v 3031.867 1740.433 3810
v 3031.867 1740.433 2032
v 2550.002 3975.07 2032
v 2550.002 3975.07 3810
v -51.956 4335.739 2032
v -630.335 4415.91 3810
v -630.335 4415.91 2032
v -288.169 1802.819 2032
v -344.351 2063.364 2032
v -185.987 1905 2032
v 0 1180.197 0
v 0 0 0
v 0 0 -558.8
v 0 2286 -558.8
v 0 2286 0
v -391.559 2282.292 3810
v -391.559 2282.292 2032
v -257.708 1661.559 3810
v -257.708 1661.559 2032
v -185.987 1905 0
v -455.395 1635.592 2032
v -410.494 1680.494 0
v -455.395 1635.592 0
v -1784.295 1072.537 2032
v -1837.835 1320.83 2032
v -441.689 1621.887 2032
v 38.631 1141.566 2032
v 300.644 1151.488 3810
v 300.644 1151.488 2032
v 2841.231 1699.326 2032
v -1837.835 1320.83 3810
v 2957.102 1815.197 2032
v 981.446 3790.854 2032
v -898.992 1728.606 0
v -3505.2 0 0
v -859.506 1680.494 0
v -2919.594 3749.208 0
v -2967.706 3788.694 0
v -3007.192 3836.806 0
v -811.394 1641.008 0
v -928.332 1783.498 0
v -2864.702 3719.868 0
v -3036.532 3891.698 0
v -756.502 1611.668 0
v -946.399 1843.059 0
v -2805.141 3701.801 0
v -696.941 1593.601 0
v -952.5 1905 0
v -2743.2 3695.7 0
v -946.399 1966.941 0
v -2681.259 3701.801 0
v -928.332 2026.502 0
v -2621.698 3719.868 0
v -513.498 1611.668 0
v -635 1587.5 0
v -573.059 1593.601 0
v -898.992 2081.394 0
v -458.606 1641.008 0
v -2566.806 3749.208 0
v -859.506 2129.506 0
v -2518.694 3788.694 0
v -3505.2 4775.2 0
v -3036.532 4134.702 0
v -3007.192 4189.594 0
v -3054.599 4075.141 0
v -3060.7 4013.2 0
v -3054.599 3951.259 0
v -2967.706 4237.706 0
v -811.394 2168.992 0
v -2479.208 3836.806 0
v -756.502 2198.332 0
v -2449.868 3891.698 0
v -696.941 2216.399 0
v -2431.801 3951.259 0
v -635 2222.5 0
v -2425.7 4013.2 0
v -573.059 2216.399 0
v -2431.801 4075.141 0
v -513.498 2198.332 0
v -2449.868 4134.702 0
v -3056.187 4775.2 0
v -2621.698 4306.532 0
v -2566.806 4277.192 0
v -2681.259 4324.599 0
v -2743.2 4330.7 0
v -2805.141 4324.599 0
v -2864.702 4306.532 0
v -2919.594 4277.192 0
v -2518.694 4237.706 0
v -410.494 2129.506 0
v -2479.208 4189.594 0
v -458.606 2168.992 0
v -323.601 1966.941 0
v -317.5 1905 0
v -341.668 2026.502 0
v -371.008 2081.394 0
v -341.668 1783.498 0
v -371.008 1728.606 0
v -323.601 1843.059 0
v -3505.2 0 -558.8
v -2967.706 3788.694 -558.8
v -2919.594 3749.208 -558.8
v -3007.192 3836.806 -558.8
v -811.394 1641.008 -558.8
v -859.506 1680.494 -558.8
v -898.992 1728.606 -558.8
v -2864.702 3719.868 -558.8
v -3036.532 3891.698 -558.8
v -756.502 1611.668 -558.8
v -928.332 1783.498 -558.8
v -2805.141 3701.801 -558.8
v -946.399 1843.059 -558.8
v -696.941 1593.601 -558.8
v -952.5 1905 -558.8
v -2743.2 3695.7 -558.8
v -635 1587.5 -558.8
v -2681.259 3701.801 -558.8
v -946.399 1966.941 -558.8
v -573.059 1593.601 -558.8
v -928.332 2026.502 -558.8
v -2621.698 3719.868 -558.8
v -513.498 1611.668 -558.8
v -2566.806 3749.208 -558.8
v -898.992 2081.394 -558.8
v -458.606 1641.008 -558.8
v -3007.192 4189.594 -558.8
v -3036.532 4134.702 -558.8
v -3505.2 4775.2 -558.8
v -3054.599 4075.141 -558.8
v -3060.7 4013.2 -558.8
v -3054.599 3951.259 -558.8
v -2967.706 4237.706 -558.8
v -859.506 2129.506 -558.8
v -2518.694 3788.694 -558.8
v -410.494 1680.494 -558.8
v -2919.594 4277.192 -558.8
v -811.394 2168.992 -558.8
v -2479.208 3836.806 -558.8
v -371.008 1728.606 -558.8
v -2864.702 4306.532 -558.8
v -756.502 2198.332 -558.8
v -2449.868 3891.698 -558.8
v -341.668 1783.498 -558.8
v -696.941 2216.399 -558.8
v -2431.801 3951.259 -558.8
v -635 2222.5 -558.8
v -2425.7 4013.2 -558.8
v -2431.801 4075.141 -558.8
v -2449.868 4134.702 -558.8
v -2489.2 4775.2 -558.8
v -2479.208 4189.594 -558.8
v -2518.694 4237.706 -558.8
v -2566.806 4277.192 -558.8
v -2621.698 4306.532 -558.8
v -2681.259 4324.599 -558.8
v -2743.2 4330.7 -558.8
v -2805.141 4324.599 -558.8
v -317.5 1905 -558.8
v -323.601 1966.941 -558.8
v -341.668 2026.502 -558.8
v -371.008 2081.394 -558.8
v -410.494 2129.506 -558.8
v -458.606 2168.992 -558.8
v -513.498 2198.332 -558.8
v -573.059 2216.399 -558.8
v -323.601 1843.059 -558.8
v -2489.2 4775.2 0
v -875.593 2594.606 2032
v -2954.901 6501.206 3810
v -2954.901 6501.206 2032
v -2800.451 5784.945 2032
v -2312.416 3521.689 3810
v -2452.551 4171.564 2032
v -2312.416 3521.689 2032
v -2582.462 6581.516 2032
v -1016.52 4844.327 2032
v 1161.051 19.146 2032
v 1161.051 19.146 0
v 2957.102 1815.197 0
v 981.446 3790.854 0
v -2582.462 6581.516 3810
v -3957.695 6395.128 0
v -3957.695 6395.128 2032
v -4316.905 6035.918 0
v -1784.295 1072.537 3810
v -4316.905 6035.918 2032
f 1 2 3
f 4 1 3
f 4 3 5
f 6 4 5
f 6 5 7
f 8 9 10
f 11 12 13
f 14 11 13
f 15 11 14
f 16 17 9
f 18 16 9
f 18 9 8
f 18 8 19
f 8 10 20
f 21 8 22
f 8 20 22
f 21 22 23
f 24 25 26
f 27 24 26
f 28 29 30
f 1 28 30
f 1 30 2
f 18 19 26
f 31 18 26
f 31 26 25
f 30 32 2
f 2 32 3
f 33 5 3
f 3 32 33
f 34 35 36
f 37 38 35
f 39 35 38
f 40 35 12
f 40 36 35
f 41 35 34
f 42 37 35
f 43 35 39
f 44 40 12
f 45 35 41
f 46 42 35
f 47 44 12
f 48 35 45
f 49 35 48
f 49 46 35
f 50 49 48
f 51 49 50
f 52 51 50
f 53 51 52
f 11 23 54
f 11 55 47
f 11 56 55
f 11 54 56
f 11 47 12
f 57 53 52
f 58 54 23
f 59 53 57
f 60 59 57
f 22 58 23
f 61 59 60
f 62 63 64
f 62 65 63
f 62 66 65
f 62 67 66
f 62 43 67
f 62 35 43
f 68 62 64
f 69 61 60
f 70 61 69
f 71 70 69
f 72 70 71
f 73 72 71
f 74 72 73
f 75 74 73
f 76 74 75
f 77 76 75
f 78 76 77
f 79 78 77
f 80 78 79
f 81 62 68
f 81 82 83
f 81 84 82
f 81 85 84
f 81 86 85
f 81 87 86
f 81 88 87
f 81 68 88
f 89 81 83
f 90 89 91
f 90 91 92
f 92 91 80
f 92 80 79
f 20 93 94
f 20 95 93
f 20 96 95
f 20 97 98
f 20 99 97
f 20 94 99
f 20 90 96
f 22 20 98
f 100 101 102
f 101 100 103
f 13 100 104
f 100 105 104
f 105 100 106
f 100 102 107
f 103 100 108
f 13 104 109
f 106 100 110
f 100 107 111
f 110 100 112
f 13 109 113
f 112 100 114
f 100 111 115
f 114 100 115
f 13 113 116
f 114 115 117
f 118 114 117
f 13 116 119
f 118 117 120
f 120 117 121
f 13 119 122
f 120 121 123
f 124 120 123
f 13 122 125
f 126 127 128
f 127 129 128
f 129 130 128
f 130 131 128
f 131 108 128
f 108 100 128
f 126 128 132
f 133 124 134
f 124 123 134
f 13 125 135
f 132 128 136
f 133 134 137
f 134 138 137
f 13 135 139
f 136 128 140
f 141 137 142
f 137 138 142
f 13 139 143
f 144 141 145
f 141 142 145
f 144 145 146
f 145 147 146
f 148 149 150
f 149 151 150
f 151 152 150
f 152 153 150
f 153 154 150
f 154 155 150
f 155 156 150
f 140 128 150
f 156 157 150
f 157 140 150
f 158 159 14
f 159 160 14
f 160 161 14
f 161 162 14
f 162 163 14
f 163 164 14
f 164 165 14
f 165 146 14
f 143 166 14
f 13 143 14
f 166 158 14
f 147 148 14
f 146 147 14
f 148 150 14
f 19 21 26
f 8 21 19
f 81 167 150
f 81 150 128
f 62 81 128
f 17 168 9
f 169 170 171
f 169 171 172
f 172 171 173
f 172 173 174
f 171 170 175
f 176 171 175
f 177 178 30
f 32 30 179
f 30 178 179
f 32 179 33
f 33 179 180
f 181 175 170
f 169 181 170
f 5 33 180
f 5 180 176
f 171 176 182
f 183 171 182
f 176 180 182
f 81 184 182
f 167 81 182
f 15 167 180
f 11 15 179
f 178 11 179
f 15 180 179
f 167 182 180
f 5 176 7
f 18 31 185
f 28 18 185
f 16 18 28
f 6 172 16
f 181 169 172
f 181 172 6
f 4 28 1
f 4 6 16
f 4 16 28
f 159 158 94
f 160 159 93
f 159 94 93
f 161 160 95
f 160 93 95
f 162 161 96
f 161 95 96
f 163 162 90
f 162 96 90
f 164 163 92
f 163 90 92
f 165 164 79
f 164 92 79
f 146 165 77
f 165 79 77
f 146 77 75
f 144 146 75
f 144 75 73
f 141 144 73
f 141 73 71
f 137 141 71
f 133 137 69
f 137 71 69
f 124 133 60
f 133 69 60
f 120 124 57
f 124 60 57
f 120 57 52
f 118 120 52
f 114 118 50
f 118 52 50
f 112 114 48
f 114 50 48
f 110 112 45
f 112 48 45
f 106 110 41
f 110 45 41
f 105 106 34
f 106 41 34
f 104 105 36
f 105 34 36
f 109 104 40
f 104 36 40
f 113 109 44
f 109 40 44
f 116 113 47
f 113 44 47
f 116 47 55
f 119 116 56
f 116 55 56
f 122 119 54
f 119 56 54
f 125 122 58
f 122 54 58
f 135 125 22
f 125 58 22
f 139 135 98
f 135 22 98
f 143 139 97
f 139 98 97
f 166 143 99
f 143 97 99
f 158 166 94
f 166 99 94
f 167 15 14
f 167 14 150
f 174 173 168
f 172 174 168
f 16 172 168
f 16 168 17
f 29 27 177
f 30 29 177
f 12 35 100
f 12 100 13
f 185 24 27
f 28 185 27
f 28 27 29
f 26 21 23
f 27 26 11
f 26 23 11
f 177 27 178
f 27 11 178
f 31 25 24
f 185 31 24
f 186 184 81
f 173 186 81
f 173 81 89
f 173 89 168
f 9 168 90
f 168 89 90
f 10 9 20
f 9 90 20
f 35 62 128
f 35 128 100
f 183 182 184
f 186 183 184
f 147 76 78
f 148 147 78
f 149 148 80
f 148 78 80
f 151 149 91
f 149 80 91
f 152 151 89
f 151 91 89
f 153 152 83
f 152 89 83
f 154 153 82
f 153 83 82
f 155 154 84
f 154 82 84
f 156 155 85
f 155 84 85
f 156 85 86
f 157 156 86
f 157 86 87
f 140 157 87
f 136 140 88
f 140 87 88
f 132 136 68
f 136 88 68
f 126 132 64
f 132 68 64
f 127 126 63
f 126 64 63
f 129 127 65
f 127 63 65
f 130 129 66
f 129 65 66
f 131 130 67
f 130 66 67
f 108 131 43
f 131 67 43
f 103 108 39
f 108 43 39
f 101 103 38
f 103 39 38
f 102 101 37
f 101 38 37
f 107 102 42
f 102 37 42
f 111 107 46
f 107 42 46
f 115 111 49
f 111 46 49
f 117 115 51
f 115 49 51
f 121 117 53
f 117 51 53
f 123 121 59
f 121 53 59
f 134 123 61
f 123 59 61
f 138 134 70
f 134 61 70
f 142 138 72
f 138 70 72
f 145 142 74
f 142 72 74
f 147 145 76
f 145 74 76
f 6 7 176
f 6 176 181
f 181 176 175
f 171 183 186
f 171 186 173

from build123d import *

# Parameters (mm, degrees)
F0_R     = 317.5
F2_DEPTH = 558.8
F4_DEPTH = 2032
F6_DEPTH = 1778


# Not quite as in the source:
# - the program builds the solid bodies; features that only make, move or delete a surface that nothing else refers to are left out


with BuildPart() as f2:
    # F0 (on Top) → F2 (new body)
    with BuildSketch(Plane.XY):
        Polygon((-2489.2, 4775.2), (-3505.2, 4775.2), (-3505.2, 4013.2), (-3505.2, 0), (0, 0), (0, 2286), (-508, 2794), align=None)
        with Locations((-2743.2, 4013.2)):
            Circle(F0_R, mode=Mode.SUBTRACT)
        with Locations((-635, 1905)):
            Circle(F0_R, mode=Mode.SUBTRACT)
    extrude(amount=-F2_DEPTH)

    # F1 (on face) → F4 (join)
    with BuildSketch(Plane.XY):
        Polygon((-3957.6947647956, 6395.1280605346), (-4316.9050096384, 6035.9178156918), (-185.9871939465, 1905), (-455.3948775786, 1635.5923163679), (1161.0512242138, 19.1462145755), (2957.1024484277, 1815.1974387893), (981.4461017924, 3790.8537854245), align=None)
    extrude(amount=F4_DEPTH)

    # F5 (on face) → F6 (join)
    with BuildSketch(Plane.XY.offset(2032)):
        Polygon((-257.708154999, 1661.5593220192), (-1837.8351896914, 1320.8298776882), (-1784.2947228834, 1072.5368684955), (300.6435319736, 1151.4881192346), (3031.8666330935, 1740.4332541235), (2550.0024318207, 3975.0703368579), (-630.3354958211, 4415.9102396305), (-2582.4618889505, 6581.5162458871), (-2954.9014027396, 6501.205545675), (-2312.4158010426, 3521.6894353624), (-391.5593220192, 2282.291845001), align=None)
    extrude(amount=F6_DEPTH)


solid = f2.part
